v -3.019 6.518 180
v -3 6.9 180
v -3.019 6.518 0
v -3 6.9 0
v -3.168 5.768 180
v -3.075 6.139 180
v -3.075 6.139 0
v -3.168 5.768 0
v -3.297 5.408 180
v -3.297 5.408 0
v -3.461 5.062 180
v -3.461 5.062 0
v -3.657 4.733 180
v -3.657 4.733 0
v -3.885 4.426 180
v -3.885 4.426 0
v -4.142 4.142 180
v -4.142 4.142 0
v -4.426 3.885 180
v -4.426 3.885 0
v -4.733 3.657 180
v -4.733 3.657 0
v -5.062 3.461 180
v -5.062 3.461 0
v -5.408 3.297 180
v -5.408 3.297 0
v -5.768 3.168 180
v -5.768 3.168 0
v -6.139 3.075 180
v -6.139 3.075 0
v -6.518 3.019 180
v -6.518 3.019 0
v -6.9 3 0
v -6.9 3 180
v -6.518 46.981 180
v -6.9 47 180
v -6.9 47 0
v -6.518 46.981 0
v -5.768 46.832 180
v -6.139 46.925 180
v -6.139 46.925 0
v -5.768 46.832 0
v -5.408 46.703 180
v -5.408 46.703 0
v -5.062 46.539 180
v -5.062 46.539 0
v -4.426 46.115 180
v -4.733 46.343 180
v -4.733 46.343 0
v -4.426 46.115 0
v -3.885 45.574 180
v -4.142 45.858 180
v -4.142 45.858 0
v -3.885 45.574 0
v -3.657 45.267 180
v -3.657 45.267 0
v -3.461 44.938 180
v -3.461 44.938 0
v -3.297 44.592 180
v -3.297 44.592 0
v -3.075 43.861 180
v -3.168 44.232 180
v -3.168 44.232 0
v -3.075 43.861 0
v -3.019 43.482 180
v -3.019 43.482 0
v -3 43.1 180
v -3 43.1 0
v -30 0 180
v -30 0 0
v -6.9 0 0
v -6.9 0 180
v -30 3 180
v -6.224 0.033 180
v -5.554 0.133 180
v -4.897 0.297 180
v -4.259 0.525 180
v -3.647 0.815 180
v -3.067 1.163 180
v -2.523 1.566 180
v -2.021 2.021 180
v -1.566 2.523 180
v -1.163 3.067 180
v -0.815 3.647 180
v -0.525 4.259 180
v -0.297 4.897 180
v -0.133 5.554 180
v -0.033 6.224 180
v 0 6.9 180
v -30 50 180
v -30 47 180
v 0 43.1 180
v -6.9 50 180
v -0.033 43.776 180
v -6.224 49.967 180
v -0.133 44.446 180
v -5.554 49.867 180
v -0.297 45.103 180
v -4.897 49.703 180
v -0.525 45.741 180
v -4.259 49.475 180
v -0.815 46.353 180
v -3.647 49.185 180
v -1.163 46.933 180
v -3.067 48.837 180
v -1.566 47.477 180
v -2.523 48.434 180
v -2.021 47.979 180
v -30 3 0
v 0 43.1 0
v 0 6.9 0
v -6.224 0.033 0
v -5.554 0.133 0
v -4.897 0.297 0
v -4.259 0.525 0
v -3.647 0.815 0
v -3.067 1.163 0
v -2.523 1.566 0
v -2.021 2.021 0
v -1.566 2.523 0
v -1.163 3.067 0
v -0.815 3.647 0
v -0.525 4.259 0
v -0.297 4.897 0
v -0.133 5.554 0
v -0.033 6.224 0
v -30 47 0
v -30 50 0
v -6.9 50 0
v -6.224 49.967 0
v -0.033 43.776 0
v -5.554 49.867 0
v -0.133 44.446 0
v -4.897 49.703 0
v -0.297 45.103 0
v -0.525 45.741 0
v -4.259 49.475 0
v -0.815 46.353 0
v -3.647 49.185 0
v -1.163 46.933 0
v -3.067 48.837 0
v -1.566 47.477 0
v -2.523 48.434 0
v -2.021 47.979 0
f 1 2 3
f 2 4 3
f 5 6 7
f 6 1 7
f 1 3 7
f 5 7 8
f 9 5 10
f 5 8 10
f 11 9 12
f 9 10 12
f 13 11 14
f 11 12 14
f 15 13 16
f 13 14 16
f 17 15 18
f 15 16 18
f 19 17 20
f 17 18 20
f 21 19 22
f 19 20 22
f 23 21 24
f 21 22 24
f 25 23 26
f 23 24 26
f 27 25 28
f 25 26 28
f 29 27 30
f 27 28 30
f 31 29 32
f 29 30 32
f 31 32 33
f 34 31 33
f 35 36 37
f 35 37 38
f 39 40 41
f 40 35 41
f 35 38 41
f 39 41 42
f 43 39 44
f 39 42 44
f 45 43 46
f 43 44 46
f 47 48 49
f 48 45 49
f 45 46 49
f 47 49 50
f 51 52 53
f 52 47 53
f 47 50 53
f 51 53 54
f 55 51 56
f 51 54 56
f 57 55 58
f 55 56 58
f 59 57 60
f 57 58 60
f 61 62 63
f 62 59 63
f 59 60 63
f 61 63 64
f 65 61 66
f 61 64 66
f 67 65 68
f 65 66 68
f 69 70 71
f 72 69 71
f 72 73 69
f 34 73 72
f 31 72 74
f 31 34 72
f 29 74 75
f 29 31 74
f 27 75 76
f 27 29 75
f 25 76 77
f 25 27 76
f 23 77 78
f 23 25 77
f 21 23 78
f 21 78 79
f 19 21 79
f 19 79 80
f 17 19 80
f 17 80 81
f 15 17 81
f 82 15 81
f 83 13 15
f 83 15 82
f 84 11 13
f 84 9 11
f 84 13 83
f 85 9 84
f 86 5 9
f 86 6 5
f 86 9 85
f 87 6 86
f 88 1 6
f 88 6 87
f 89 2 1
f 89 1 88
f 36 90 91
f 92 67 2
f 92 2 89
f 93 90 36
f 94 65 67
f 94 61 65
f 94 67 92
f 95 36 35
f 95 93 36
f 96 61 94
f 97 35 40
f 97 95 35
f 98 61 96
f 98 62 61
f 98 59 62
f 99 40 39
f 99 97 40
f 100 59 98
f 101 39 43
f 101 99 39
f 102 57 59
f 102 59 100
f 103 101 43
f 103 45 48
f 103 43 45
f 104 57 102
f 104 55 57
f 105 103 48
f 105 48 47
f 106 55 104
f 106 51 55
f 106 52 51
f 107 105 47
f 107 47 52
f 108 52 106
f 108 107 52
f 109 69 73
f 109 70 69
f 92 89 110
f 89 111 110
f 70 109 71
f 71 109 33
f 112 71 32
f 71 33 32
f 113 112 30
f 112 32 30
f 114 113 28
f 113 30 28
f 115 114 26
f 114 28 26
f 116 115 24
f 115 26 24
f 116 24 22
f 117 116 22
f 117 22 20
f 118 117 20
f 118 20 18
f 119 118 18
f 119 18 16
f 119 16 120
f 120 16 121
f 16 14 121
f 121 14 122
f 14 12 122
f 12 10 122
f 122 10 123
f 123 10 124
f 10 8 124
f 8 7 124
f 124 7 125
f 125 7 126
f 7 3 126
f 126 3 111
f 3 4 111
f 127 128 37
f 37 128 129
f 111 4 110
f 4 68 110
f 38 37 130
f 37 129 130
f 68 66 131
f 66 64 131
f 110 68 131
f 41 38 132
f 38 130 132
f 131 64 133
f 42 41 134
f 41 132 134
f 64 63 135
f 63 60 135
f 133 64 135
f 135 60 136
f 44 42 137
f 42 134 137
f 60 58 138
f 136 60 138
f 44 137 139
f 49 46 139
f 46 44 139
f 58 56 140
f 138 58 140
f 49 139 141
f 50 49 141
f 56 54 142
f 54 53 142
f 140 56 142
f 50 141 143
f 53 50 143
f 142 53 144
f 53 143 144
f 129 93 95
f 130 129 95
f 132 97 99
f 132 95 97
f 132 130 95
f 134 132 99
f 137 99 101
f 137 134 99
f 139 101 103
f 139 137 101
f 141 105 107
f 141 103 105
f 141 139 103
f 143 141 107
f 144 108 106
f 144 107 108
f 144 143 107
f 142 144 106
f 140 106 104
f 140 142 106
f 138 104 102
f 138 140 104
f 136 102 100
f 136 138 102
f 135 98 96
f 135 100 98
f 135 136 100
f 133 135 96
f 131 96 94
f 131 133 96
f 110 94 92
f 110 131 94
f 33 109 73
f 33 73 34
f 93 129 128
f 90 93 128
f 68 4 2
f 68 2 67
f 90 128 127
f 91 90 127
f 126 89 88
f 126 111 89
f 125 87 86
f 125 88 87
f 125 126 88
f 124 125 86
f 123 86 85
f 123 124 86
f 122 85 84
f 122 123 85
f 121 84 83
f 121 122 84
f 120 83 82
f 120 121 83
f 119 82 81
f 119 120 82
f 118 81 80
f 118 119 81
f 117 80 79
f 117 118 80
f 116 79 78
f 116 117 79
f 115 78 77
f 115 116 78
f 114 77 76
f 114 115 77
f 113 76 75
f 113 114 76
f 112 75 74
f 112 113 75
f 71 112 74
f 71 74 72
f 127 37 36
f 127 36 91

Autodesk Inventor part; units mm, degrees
ref_plane "YZ Plane" through (0, 0, 0) normal (1, 0, 0) x (0, 1, 0)
ref_plane "XZ Plane" through (0, 0, 0) normal (0, 1, 0) x (-1, 0, 0)
ref_plane "XY Plane" through (0, 0, 0) normal (0, 0, 1) x (1, 0, 0)
sketch "Sketch1" plane through (0, 0, 0) normal (0, 0, 1) x (1, 0, 0)
  line L0 (-30, 0) -> (0, 0)
  line L1 (0, 0) -> (0, 50)
  line L2 (0, 50) -> (-30, 50)
  dimension "d0" = 30
  dimension "d1" = 30
  dimension "d2" = 50
contour flange "Contour Flange1" sketch "Sketch1" thickness 3 bend radius 3.9 width 180 along (0, 0, 1) mid plane no both sides no wall seen from (-15, 0, 0) lies toward (0, 1, 0) curves L0 L1 L2
bend "Bend1"
corner "Corner1"
equation "\"d1\" = d0"
equation "\"d3\" = BendReliefWidth"
equation "\"d4\" = BendReliefDepth"
equation "\"d5\" = MinimumRemnant"
equation "\"d6\" = BendRadius"
equation "\"d8\" = BendRadius"
equation "\"d10\" = CornerReliefSize"
equation "\"d11\" = GapSize"
equation "\"d12\" = JacobiRadiusSize"
equation "\"BendReliefWidth\" = Thickness"
equation "\"BendReliefDepth\" = 0.5 * Thickness"
equation "\"CornerReliefSize\" = 4 * Thickness"
equation "\"MinimumRemnant\" = 2 * Thickness"
equation "\"TransitionRadius\" = BendRadius"
equation "\"JacobiRadiusSize\" = BendRadius"
equation "\"GapSize\" = Thickness"
equation "\"BendRadius\" = 3.9"
equation "\"Thickness\" = 3"
properties part number "Poot"
